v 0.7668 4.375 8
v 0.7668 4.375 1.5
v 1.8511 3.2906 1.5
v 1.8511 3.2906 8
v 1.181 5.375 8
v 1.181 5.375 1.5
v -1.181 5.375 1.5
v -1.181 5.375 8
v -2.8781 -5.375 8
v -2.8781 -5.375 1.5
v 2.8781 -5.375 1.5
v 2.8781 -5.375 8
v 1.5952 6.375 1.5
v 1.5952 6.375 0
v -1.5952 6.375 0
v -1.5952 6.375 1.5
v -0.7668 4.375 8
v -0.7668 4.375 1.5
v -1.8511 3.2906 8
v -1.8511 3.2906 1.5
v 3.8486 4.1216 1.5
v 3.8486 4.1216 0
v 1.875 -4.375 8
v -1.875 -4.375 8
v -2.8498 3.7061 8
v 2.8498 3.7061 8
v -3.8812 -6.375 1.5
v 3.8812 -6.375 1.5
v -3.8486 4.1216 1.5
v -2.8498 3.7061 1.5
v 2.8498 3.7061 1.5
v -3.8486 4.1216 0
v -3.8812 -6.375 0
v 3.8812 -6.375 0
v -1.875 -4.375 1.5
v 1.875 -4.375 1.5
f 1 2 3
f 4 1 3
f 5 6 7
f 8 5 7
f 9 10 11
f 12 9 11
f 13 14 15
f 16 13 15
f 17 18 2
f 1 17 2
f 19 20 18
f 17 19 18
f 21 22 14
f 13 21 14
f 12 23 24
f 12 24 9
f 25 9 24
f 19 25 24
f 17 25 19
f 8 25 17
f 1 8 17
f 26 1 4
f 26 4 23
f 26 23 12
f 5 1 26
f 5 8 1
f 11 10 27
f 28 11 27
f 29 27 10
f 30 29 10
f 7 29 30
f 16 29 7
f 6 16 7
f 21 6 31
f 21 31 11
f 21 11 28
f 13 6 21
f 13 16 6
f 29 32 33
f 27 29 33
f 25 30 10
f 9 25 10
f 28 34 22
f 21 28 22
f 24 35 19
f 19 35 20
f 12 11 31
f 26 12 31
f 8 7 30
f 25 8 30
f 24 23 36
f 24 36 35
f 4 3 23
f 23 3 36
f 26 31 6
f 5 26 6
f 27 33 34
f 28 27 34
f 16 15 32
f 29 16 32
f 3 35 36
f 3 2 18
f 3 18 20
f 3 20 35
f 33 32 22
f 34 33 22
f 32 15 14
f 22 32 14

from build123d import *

# Parameters (mm, degrees)
F1_DEPTH = 8
F2_DEPTH = 1.5


with BuildPart() as f1:
    # F0 (on Top) → F1 (new body)
    with BuildSketch(Plane.XY):
        Polygon((-1.180977, 5.375), (-2.849841, 3.706136), (-2.878119, -5.375), (2.878119, -5.375), (2.849841, 3.706136), (1.180977, 5.375), align=None)
        Polygon((1.85113, 3.290633), (1.875, -4.375), (-1.875, -4.375), (-1.85113, 3.290633), (-0.766763, 4.375), (0.766763, 4.375), align=None, mode=Mode.SUBTRACT)
    extrude(amount=F1_DEPTH)

    # F0 (on Top) → F2 (join)
    with BuildSketch(Plane.XY):
        Polygon((-1.59519, 6.375), (-3.848552, 4.121638), (-3.881237, -6.375), (3.881237, -6.375), (3.848552, 4.121638), (1.59519, 6.375), align=None)
        Polygon((-2.878119, -5.375), (-2.849841, 3.706136), (-1.180977, 5.375), (1.180977, 5.375), (2.849841, 3.706136), (2.878119, -5.375), align=None, mode=Mode.SUBTRACT)
        Polygon((-1.875, -4.375), (1.875, -4.375), (1.85113, 3.290633), (1.85113, 1.757106), (0.766763, 0.672739), (-0.766763, 0.672739), (-1.85113, 1.757106), (-1.85113, 3.290633), align=None)
        Polygon((1.85113, 1.757106), (1.85113, 3.290633), (0.766763, 4.375), (-0.766763, 4.375), (-1.85113, 3.290633), (-1.85113, 1.757106), (-0.766763, 0.672739), (0.766763, 0.672739), align=None)
    extrude(amount=F2_DEPTH)


solid = f1.part
